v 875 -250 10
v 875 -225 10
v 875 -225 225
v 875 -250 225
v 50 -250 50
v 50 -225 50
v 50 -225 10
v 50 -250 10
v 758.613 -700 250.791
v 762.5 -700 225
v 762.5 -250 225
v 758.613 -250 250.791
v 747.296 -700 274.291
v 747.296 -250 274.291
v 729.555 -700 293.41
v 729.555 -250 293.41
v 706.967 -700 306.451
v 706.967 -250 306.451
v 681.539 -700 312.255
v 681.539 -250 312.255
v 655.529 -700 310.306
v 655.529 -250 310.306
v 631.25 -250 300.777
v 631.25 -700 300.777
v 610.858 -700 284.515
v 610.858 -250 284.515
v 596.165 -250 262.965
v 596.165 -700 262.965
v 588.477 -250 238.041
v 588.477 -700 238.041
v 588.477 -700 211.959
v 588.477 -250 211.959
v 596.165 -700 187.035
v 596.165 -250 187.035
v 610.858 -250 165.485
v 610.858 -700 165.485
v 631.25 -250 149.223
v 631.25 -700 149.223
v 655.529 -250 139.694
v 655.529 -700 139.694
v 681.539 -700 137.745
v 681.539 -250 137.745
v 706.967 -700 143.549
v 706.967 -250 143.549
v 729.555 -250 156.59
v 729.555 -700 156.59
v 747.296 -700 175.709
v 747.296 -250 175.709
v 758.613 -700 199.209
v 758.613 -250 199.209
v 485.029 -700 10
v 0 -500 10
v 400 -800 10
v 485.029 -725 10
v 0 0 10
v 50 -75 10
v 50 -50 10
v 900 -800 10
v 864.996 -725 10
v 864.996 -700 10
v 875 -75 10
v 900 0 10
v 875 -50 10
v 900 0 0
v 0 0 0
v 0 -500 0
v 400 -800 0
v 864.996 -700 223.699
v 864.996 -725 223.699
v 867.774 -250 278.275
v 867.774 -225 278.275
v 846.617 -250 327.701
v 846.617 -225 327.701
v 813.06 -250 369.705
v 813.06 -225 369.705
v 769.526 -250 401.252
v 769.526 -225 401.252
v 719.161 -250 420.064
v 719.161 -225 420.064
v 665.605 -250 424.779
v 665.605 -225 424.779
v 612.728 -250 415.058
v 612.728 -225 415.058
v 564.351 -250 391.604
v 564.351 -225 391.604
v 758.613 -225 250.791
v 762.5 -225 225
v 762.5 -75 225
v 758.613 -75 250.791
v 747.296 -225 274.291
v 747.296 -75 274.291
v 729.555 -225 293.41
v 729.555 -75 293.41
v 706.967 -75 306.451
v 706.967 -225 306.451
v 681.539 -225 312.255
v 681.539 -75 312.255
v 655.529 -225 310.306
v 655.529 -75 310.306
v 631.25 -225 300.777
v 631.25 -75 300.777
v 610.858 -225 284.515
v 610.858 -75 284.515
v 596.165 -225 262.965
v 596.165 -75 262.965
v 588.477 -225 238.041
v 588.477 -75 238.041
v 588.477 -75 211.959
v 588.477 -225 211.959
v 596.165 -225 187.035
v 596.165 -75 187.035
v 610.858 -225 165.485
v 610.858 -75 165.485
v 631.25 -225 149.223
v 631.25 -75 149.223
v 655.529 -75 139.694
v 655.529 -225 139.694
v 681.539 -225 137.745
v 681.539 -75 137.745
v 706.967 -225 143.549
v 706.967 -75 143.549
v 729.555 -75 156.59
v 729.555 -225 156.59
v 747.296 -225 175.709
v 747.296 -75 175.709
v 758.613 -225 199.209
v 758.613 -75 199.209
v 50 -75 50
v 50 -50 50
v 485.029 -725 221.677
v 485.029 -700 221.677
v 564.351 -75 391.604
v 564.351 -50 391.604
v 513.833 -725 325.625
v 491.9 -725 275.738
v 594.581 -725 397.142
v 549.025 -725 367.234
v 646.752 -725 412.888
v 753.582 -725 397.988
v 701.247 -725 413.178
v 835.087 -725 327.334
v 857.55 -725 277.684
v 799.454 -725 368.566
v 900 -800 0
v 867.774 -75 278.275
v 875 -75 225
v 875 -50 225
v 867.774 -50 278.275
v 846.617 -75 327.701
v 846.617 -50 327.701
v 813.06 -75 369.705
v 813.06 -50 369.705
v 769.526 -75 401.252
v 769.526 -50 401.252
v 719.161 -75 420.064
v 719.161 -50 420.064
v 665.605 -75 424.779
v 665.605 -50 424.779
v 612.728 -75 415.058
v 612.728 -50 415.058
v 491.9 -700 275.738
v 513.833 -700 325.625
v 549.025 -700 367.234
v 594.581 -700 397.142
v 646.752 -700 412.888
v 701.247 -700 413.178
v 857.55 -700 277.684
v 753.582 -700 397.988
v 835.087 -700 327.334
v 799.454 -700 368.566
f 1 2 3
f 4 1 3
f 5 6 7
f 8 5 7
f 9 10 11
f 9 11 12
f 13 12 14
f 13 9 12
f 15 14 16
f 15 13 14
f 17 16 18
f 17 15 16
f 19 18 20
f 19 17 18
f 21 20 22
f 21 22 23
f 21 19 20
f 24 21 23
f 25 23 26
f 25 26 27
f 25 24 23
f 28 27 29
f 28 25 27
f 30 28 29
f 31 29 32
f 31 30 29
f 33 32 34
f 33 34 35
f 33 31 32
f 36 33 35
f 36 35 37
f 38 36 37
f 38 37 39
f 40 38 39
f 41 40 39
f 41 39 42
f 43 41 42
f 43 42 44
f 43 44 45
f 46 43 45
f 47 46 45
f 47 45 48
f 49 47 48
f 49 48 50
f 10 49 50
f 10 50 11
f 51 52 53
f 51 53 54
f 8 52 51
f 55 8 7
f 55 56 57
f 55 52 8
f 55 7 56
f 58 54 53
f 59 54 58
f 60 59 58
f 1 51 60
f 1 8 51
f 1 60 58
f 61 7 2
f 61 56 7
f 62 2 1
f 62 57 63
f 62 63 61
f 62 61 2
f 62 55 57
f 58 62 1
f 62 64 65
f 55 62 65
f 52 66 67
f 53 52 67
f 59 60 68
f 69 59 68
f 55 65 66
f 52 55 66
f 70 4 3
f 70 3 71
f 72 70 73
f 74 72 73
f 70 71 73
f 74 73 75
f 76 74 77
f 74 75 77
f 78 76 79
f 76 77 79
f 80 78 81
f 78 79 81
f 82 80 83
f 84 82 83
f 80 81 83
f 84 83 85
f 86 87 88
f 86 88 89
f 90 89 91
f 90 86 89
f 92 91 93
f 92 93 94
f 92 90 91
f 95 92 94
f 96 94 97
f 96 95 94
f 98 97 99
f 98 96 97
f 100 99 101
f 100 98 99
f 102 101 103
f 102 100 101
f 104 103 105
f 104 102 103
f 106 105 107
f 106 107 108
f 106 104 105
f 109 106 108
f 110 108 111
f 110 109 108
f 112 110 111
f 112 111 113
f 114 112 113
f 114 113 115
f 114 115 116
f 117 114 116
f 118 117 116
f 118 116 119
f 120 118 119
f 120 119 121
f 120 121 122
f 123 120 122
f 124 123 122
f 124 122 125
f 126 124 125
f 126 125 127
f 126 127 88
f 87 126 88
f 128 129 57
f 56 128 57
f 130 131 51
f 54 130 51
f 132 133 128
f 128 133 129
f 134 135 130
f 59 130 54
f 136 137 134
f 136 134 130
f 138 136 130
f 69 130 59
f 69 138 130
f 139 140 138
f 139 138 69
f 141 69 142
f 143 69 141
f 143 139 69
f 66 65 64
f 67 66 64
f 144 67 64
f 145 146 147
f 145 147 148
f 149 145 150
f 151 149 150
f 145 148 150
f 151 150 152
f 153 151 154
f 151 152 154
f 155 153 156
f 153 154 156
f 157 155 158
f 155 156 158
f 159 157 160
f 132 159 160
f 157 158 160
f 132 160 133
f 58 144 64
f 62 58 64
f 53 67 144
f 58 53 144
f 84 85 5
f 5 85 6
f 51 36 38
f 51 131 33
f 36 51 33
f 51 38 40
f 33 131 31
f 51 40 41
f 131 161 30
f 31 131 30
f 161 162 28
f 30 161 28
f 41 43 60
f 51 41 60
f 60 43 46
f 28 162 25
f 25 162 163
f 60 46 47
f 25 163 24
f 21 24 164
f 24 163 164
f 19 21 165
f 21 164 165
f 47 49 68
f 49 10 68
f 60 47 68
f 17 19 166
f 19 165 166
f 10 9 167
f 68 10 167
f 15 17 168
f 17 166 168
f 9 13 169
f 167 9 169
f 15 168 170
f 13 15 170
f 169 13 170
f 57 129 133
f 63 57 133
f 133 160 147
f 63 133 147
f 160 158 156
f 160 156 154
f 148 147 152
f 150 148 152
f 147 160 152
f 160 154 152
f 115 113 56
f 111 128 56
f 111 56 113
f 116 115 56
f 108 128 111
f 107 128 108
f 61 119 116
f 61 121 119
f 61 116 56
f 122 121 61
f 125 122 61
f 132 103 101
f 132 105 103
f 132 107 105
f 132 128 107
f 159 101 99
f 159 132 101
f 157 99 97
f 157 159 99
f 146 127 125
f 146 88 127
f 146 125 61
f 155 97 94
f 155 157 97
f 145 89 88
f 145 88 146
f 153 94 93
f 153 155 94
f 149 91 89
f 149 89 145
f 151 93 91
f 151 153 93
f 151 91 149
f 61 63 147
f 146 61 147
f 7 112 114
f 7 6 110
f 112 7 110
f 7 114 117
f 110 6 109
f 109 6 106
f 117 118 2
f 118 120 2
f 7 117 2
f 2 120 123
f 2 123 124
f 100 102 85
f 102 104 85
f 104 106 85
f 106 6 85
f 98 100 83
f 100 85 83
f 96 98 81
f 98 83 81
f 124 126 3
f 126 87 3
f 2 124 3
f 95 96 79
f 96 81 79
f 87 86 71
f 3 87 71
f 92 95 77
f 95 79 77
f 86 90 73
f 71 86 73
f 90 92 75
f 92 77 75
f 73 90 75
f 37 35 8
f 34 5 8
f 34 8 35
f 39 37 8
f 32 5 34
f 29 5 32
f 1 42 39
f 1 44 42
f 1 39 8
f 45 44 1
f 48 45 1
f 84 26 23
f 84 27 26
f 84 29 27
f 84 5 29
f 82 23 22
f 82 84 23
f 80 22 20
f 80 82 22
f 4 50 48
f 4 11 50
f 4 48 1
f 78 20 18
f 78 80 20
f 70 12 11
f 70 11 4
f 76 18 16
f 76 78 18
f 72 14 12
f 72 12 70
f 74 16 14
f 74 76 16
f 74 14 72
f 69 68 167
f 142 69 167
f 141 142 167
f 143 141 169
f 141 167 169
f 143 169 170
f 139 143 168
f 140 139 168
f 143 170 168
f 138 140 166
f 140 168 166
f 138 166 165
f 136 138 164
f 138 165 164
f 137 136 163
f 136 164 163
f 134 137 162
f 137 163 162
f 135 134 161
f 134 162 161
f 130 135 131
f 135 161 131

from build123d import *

# Parameters (mm, degrees)
F4_DEPTH  = 10
F5_DEPTH  = 25
F8_DEPTH  = 25
F9_R      = 87.5
F10_DEPTH = 650


with BuildPart() as f4:
    # F0 (on Top) → F4 (new body)
    with BuildSketch(Plane.XY):
        Polygon((900, 0), (0, 0), (0, -500), (400, -800), (900, -800), align=None)
    extrude(amount=F4_DEPTH)

    # F3 (on offset) → F8 (join)
    with BuildSketch(Plane.XZ.offset(700)):
        with BuildLine():
            Line((864.9955457431, 0), (864.9955457431, 223.6990012303))
            ThreePointArc((864.9955457431, 223.6990012303), (673.9888114785, 414.9973091856), (485.0290649374, 221.6767739387))
            Line((485.0290649374, 221.6767739387), (485.0290649374, 0))
            Line((485.0290649374, 0), (864.9955457431, 0))
        make_face()
    extrude(amount=F8_DEPTH)



with BuildPart() as f5:
    # F1 (on Front) → F5 (new body)
    with BuildSketch(Plane.XZ):
        with BuildLine():
            Line((50, 50), (50, 0))
            Line((50, 0), (875, 0))
            Line((875, 0), (875, 225))
            ThreePointArc((875, 225), (769.5256396076, 401.2523856768), (564.3509654323, 391.6036948847))
            Line((564.3509654323, 391.6036948847), (50, 50))
        make_face()
    extrude(amount=F5_DEPTH)


with BuildPart() as f5_1:
    # F6: moved
    add(f5.part.moved(Location((0, -50, 0))))


with BuildPart() as f7_1:
    # F7: copy of F5
    add(f5_1.part.moved(Location((0, -175, 0))))


with BuildPart() as f4_1:
    add(f4.part)

    add(f5_1.part)  # F10 merges F5

    add(f7_1.part)  # F10 merges F7_1
    # F9 (on offset) → F10 (join, through all)
    with BuildSketch(Plane.XZ.offset(700)):
        with Locations((675, 225)):
            Circle(F9_R)
    extrude(amount=-F10_DEPTH)


solid = f4_1.part
